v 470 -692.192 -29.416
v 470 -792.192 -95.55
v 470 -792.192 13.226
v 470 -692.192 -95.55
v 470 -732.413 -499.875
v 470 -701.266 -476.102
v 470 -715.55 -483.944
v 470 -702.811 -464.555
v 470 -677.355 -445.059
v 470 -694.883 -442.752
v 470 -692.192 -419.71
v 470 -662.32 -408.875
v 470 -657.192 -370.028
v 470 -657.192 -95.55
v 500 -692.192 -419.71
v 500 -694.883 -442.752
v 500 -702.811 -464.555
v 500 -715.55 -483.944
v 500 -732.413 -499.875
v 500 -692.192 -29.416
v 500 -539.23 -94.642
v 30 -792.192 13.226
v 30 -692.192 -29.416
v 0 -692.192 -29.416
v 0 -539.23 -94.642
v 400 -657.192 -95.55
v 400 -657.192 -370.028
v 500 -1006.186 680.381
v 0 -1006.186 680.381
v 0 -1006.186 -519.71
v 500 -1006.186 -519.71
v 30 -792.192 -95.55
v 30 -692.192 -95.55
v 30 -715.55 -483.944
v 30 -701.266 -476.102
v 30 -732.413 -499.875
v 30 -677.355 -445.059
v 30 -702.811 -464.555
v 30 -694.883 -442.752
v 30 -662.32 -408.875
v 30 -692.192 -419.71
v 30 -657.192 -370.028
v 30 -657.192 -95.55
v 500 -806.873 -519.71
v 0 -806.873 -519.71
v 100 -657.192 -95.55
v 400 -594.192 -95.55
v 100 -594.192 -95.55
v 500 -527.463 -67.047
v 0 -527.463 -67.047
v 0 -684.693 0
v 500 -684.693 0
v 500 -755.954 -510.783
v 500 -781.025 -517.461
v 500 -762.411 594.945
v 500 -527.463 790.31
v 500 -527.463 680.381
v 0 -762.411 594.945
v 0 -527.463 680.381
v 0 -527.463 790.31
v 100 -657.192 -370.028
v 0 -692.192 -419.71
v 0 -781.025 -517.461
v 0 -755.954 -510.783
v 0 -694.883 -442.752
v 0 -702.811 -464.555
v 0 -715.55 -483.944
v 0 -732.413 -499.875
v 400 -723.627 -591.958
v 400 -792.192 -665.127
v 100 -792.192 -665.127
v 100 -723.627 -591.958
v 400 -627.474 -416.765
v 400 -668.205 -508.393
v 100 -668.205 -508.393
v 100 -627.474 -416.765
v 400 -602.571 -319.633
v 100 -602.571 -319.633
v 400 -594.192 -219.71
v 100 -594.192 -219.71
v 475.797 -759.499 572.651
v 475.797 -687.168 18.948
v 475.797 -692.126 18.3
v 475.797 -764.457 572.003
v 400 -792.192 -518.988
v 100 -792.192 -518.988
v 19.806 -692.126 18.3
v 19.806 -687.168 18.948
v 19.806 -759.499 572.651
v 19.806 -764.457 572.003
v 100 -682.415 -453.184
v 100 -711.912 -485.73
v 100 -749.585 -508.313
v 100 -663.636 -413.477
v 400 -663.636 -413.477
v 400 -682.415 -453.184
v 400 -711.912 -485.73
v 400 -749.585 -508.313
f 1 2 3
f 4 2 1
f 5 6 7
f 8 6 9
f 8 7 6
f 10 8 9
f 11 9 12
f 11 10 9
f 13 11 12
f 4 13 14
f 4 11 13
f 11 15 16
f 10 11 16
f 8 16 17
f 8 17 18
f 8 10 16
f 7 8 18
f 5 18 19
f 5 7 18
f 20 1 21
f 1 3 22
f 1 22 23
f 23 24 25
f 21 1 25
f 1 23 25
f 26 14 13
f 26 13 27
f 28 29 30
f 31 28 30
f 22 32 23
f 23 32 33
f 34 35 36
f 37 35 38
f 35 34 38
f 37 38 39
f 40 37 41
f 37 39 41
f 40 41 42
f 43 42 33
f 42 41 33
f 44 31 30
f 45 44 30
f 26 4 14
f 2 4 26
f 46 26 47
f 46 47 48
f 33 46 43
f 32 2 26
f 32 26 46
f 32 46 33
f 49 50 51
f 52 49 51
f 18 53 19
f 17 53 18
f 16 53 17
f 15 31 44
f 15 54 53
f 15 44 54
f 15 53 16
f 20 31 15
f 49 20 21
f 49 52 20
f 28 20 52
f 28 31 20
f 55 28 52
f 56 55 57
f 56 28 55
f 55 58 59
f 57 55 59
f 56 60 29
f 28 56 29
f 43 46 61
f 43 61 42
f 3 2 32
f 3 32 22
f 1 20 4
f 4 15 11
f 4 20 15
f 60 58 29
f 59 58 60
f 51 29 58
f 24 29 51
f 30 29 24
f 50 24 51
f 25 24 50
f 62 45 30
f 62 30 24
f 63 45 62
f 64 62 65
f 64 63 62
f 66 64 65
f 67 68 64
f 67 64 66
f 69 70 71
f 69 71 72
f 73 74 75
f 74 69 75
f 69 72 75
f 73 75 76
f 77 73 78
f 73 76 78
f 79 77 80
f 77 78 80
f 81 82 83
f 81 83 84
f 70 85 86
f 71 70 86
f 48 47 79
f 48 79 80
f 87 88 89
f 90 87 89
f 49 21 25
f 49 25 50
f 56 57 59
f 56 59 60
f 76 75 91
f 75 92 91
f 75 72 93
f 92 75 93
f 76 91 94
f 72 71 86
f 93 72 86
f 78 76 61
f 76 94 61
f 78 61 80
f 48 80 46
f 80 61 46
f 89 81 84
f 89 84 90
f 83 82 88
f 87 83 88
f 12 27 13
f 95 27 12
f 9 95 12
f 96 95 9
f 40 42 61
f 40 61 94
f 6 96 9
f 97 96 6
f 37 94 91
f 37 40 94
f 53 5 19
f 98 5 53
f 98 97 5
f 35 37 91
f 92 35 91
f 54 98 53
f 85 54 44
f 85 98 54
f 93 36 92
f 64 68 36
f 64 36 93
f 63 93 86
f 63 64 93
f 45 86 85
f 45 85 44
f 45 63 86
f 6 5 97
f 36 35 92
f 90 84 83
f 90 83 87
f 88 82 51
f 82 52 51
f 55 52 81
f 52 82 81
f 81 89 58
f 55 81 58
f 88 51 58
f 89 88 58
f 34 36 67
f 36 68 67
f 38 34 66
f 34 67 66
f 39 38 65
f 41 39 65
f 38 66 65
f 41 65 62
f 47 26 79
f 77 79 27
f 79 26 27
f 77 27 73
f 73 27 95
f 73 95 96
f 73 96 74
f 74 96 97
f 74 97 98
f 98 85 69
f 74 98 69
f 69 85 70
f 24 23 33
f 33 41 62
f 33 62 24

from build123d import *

# Parameters (mm, degrees)
F1_DEPTH     = 500
F2_W         = 500
F2_H         = 299.909304566
F3_DEPTH     = 213.9956919492
F4_W         = 30
F4_H         = 424.5749488473
F5_DEPTH     = 100
F6_DEPTH     = 138
F7_R         = 100
F8_W         = 70
F8_H         = 424.1601228714
F9_DEPTH     = 135
F10_F1_R     = 149.6812408671
F11_W        = 300
F11_H        = 423.4383900396
F11_H_2      = 146.1387078532
F12_DEPTH    = 198
F13_T1_DEPTH = 2527.0832943561
F14_W        = 455.9908173978
F14_H        = 558.4075003862
F15_DEPTH    = 5


# Not quite as in the source:
# - a fillet or chamfer that OpenCascade refuses, or shapes differently, is made with other operations: its cross-section is extruded or revolved along the edge and cut away or added


with BuildPart() as f1:
    # F0 (on Right) → F1 (new body)
    with BuildSketch(Plane.YZ):
        Polygon((-1006.1864304423, 680.3810487322), (-1006.1864304423, -819.6189512678), (-792.191738493, -819.6189512678), (-792.191738493, 13.2260688636), (-539.2304401761, -94.6422840199), (-527.4629834979, -67.0465060217), (-684.6932624212, 0), (-762.4113425204, 594.9452916241), (-527.4629834979, 680.3810487322), (-527.4629834979, 790.310077366), align=None)
    extrude(amount=F1_DEPTH)

    # F2 (on face) → F3 (cut, through all)
    with BuildSketch(Plane(origin=(0, -792.191738493, 0), x_dir=(-1, 0, 0), z_dir=(0, 1, 0))):
        with Locations((-250, -669.6642989848)):
            Rectangle(F2_W, F2_H)
    extrude(amount=-F3_DEPTH, mode=Mode.SUBTRACT)

    # F4 (on face) → F5 (join)
    with BuildSketch(Plane(origin=(0, -792.191738493, 0), x_dir=(-1, 0, 0), z_dir=(0, 1, 0))):
        with Locations((-15, -307.4221722782)):
            Rectangle(F4_W, F4_H)
        with Locations((-485, -307.4221722782)):
            Rectangle(F4_W, F4_H)
    extrude(amount=F5_DEPTH)

    # F6 (add): faces of the model
    f6_faces = [f1.faces().sort_by_distance(p)[0] for p in [
        (15, -742.191738493, -95.1346978545),
        (485, -742.191738493, -95.1346978545),
    ]]
    extrude(f6_faces, amount=F6_DEPTH)

    # F7
    f7_edges = [f1.edges().sort_by_distance(p)[0] for p in [
        (485, -692.191738, -519.709647),
        (15, -692.191738, -519.709647),
    ]]
    fillet(f7_edges, radius=F7_R)

    # F8 (on face) → F9 (join)
    with BuildSketch(Plane(origin=(0, -792.191738493, 0), x_dir=(-1, 0, 0), z_dir=(0, 1, 0))):
        with Locations((-435, -307.6295852661)):
            Rectangle(F8_W, F8_H)
        with Locations((-65, -307.6295852661)):
            Rectangle(F8_W, F8_H)
    extrude(amount=F9_DEPTH)

    # F10: fillet of radius 149.6812408671 on 2 edges, made by hand

    # F10_f1
    f10_f1_edges = [f1.edges().sort_by_distance(p)[0] for p in [
        (435, -657.191738493, -519.7096467018),
    ]]
    fillet(f10_f1_edges, radius=F10_F1_R)

    # F11 (on face) → F12 (join)
    with BuildSketch(Plane(origin=(0, -792.191738493, 0), x_dir=(-1, 0, 0), z_dir=(0, 1, 0))):
        with Locations((-250, -307.2687188502)):
            Rectangle(F11_W, F11_H)
        with Locations((-250, -592.0572677966)):
            Rectangle(F11_W, F11_H_2)
    extrude(amount=F12_DEPTH)

    # F13: fillet of radius 600 on 1 edges, made by hand

    # F13_s2 → F13_t1 (cut)
    with BuildSketch(Plane.YZ.offset(-1013.541647178)):
        with BuildLine():
            ThreePointArc((-792.191738493, -665.1266217232), (-645.9217320181, -463.431114991), (-594.191738493, -219.709962852))
            Line((-594.191738493, -219.709962852), (-594.191738493, -665.1266217232))
            Line((-594.191738493, -665.1266217232), (-792.191738493, -665.1266217232))
        make_face()
    extrude(amount=F13_T1_DEPTH, mode=Mode.SUBTRACT)

    # F14 (on face) → F15 (cut)
    with BuildSketch(Plane(origin=(0, -673.2054408747, -87.9412529416), x_dir=(-1, 0, 0), z_dir=(0, 0.991575486, 0.1295301335))):
        with Locations((-247.8018868715, 387.0010599494)):
            Rectangle(F14_W, F14_H)
    extrude(amount=-F15_DEPTH, mode=Mode.SUBTRACT)


solid = f1.part
